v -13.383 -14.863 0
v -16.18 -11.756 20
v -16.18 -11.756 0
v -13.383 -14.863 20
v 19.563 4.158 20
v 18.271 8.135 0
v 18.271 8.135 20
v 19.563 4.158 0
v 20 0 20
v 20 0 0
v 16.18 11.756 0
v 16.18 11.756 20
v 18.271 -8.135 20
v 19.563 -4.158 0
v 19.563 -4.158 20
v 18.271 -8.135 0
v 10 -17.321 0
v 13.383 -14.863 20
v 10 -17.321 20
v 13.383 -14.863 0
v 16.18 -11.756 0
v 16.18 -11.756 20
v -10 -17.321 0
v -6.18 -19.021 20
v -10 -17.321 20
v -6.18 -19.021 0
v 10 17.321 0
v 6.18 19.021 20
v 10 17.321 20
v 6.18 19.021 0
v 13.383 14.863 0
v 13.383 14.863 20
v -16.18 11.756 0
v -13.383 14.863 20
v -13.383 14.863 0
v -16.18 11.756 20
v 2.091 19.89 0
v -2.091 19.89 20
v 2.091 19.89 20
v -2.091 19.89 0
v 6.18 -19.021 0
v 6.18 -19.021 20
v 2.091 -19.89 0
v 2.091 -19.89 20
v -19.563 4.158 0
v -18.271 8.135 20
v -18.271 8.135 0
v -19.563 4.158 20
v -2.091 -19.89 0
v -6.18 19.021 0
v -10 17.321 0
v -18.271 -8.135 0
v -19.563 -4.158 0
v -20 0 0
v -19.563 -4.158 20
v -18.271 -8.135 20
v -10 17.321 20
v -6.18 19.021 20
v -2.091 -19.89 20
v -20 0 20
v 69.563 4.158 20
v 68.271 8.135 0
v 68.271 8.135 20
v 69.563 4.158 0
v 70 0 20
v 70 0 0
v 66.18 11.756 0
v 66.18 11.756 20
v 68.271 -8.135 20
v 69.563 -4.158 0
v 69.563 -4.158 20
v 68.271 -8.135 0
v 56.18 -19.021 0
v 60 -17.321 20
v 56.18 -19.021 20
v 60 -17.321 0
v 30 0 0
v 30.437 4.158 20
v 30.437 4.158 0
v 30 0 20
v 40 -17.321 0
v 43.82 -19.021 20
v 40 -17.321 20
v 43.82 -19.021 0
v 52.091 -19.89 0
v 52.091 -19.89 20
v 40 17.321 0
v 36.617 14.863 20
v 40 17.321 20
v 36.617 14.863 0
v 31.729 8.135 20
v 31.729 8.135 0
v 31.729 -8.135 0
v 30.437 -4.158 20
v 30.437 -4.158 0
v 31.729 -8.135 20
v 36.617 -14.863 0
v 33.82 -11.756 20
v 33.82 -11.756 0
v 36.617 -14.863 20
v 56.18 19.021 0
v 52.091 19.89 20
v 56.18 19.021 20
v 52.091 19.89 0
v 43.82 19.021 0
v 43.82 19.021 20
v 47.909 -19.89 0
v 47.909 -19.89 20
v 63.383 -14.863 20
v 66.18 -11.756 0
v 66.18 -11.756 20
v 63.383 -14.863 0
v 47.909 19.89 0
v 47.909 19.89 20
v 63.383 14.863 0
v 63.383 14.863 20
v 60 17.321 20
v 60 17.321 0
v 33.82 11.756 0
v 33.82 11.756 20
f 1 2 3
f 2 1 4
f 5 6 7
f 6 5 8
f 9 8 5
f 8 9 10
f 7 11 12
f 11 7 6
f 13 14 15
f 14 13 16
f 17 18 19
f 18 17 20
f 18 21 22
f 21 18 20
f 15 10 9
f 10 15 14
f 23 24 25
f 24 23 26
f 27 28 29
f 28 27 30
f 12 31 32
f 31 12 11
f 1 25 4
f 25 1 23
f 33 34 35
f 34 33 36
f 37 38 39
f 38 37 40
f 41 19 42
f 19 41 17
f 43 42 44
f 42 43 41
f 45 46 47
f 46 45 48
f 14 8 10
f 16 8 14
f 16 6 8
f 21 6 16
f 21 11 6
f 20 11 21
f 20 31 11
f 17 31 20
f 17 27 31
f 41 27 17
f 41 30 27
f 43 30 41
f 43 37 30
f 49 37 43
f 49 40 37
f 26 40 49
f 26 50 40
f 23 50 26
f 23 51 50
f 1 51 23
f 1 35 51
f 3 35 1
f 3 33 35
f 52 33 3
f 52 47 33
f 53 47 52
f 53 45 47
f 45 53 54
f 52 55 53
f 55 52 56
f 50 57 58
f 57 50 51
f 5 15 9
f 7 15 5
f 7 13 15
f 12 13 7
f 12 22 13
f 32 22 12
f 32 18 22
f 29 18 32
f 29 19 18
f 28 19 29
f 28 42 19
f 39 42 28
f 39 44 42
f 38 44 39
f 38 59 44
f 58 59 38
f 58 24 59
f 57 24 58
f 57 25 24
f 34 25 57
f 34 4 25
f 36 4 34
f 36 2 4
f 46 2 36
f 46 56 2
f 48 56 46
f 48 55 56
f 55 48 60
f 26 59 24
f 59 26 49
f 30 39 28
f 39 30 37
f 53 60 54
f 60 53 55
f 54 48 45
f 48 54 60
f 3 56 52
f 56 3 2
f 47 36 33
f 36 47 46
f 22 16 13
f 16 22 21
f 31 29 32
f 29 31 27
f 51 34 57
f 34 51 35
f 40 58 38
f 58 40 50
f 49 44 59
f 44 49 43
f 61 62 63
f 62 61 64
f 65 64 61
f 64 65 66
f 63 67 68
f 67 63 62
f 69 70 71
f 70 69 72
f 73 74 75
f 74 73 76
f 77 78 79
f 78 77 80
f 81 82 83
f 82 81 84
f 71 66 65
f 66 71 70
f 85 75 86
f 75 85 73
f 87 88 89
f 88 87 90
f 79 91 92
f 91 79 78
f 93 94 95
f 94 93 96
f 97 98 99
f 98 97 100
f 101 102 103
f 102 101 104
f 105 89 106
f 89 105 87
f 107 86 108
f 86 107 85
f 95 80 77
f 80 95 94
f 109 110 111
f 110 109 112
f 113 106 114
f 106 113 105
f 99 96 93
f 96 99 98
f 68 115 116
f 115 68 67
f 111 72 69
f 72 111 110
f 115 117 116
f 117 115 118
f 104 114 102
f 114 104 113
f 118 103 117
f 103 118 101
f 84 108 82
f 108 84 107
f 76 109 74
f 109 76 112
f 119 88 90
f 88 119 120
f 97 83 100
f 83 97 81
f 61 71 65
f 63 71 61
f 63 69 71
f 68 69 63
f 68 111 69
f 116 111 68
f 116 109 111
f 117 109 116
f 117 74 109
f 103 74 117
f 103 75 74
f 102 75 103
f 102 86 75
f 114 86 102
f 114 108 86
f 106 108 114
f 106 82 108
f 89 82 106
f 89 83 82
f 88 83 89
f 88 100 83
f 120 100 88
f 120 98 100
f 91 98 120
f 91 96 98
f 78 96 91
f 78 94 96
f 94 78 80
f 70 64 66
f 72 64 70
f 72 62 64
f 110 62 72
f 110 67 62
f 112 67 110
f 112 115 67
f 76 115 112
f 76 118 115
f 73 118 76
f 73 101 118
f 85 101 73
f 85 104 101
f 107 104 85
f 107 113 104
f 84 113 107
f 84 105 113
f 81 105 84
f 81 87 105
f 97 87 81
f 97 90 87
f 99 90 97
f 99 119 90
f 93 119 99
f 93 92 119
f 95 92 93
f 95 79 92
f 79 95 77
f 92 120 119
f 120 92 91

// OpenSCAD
x = 10;
cylinder(h=20,r=x);
x=20;
translate([50,0,0])
cylinder(h=20,r=x);
